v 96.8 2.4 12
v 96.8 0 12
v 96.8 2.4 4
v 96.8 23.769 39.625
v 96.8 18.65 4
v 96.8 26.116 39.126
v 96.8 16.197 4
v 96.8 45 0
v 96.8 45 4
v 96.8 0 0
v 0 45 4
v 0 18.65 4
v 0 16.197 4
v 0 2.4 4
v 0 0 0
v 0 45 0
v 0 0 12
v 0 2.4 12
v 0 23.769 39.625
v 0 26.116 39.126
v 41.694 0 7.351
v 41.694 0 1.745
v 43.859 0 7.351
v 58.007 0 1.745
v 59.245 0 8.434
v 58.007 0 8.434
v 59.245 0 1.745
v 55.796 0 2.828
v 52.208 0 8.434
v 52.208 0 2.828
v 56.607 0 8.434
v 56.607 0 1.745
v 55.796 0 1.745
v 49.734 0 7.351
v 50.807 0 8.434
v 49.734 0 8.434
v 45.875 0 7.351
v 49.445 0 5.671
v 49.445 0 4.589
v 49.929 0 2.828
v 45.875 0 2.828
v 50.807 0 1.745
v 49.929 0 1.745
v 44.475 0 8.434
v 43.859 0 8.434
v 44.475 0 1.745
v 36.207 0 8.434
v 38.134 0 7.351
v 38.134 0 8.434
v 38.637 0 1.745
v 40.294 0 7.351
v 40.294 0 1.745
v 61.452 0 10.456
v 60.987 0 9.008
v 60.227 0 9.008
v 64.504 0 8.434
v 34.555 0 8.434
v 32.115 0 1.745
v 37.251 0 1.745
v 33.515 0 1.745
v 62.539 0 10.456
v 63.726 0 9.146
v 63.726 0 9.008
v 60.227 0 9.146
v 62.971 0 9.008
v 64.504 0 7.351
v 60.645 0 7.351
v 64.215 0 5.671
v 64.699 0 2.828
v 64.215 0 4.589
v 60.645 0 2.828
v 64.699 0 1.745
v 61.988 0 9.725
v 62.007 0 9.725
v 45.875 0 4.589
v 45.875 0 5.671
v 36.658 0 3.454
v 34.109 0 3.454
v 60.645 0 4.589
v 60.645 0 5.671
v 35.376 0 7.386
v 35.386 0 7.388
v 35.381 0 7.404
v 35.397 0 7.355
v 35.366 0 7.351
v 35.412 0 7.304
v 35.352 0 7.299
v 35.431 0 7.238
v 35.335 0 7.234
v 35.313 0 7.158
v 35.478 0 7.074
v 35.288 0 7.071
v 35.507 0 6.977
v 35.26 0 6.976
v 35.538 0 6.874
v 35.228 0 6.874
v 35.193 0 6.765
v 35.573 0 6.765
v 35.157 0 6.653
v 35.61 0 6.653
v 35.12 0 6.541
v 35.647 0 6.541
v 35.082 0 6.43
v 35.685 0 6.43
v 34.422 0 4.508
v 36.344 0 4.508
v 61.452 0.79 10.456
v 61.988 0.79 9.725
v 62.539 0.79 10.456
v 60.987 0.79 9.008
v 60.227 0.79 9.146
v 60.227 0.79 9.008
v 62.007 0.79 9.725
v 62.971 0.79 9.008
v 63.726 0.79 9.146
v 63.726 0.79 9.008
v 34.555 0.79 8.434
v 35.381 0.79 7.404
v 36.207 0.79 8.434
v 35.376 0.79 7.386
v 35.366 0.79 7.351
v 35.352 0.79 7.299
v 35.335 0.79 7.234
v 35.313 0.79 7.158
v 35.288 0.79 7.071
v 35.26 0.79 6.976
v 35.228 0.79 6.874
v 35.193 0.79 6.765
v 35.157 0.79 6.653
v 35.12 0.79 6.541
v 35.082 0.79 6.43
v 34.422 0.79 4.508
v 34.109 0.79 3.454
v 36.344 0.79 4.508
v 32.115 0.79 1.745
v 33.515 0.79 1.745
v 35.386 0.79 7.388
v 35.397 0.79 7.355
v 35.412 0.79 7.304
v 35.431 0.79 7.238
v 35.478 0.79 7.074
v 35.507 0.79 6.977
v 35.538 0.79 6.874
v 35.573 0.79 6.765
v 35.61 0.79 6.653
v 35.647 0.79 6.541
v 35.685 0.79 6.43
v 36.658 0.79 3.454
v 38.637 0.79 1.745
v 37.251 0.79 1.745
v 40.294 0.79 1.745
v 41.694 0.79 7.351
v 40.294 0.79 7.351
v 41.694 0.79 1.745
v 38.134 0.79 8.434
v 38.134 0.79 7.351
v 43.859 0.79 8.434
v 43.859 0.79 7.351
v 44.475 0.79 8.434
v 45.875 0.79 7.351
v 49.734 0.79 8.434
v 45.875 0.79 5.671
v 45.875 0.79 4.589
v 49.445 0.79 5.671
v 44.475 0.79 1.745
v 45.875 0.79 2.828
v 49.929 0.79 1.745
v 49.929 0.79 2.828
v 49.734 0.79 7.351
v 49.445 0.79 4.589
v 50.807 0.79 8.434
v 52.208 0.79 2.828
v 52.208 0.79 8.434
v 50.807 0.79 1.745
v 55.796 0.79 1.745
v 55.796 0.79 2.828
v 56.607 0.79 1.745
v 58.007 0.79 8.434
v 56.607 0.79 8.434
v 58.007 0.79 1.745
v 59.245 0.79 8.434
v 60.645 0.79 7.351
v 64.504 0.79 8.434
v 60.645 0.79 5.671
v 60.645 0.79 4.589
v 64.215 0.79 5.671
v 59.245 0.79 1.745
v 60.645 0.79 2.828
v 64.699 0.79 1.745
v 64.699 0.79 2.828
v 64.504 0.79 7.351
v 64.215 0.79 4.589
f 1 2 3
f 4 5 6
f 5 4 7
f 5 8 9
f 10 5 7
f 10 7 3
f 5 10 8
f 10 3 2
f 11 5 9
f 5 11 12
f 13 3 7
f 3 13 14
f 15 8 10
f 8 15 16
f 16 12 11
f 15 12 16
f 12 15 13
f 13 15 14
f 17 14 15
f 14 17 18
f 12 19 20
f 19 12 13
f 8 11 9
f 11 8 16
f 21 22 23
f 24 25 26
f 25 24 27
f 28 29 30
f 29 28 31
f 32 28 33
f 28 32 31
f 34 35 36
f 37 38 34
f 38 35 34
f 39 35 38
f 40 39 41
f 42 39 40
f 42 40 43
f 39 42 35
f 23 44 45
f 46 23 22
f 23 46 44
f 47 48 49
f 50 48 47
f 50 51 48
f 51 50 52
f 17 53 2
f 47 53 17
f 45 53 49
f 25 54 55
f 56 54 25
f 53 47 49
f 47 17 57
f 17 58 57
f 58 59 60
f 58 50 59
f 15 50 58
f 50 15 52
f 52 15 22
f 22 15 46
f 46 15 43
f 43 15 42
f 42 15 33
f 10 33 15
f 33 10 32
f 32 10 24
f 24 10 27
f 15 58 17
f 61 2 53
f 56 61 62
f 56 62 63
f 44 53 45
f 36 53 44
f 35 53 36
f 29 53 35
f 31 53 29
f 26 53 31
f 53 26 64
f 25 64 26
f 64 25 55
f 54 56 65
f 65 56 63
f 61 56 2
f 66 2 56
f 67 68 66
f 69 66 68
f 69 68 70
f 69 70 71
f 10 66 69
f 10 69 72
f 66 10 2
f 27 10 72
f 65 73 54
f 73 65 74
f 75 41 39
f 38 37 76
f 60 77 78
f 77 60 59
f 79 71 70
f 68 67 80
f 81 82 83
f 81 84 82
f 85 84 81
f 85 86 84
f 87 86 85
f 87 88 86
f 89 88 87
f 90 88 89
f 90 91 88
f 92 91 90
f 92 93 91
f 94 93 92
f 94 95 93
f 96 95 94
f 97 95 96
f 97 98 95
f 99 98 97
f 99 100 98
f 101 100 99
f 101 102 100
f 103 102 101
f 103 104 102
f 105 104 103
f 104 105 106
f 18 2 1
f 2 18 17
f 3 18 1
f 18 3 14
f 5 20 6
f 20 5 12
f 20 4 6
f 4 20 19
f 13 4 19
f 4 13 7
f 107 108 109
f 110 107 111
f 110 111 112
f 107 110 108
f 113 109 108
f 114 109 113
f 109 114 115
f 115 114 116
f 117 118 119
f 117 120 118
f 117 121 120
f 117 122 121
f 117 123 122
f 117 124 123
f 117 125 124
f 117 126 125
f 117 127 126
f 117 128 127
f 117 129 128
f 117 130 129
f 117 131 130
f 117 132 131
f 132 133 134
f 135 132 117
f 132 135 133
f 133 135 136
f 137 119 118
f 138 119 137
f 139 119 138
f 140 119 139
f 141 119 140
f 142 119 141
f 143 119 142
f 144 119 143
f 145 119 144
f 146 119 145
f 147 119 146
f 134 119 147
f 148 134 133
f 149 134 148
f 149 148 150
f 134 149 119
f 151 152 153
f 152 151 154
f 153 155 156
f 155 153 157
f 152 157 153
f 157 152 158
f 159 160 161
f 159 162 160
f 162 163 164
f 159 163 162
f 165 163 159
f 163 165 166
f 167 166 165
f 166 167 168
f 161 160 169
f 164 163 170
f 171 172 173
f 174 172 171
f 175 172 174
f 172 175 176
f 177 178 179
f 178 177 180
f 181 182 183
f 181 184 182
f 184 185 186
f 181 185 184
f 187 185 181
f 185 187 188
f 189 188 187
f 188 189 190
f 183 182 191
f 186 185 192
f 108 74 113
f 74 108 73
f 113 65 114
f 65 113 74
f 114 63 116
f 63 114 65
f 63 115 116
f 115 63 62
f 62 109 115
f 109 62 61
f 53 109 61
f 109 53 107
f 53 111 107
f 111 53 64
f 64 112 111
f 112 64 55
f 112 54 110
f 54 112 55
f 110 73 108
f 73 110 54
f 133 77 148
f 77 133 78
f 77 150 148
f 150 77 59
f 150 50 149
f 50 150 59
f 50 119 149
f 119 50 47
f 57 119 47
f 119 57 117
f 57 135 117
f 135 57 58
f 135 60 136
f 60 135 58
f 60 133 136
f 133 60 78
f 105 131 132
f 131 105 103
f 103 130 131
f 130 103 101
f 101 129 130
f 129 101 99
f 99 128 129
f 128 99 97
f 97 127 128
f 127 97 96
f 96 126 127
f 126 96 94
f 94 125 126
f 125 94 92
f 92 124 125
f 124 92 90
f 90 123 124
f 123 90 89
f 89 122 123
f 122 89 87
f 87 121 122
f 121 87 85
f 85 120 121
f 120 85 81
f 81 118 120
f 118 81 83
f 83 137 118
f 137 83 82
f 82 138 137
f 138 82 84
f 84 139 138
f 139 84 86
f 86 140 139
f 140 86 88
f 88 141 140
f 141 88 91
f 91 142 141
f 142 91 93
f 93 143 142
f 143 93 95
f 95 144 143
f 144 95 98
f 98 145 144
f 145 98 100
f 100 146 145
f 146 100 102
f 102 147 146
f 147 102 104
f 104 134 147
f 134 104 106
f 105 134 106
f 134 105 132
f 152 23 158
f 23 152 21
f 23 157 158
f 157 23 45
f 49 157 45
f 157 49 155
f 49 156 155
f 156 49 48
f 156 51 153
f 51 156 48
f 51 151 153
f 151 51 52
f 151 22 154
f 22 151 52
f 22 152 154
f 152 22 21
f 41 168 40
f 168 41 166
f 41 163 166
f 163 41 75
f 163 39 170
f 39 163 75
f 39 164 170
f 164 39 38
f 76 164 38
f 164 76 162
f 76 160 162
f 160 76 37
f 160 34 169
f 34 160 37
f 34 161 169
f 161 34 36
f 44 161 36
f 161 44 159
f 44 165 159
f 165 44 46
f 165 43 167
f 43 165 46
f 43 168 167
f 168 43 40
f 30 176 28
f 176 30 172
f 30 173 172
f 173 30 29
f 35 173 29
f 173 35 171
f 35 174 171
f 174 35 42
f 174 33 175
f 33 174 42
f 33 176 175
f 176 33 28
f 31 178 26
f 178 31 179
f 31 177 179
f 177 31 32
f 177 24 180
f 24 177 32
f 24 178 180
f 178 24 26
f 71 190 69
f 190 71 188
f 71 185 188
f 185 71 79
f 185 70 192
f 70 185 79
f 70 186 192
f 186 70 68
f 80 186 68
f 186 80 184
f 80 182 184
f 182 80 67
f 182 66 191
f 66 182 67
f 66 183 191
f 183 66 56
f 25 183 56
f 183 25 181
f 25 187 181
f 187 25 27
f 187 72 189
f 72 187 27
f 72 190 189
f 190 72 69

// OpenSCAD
// Porta-cartão de mesa - impressão 3D
card_w = 90;         // largura do cartão (mm)
card_h = 50;         // altura do cartão (mm)
stack = 12;          // espessura da pilha de cartões (mm)
wall = 2.4;          // espessura das paredes (mm)
clearance = 1;       // folga para os cartões (mm)
tilt = 12;           // inclinação do encosto (graus)
base_d = 45;         // profundidade da base (mm)
base_h = 4;          // altura da base (mm)
lip_h = 12;          // altura da aba da frente (mm)
back_h = 40;         // altura do encosto (mm)
word = "ATELIÊ";     // texto gravado
font_size = 7;       // altura da letra (mm)
engrave = 0.8;       // profundidade da gravação (mm)

body_w = card_w + 2 * clearance + 2 * wall;
pocket = stack + clearance;

difference() {
    union() {
        cube([body_w, base_d, base_h]);
        cube([body_w, wall, lip_h]);
        translate([0, wall + pocket + wall, 0])
            rotate([-tilt, 0, 0])
                translate([0, -wall, 0])
cube([body_w, wall, back_h]);
    }
    translate([body_w / 2, -0.01, lip_h / 2])
        rotate([90, 0, 0])
            translate([0, 0, -engrave])
                linear_extrude(engrave + 0.01)
                    text(word, size = font_size, font = "Liberation Sans:style=Bold",
                         halign = "center", valign = "center");
}

echo(str("Largura: ", body_w, " mm"));
echo(str("Profundidade: ", base_d, " mm"));
echo(str("Altura: ", back_h * cos(tilt), " mm"));
